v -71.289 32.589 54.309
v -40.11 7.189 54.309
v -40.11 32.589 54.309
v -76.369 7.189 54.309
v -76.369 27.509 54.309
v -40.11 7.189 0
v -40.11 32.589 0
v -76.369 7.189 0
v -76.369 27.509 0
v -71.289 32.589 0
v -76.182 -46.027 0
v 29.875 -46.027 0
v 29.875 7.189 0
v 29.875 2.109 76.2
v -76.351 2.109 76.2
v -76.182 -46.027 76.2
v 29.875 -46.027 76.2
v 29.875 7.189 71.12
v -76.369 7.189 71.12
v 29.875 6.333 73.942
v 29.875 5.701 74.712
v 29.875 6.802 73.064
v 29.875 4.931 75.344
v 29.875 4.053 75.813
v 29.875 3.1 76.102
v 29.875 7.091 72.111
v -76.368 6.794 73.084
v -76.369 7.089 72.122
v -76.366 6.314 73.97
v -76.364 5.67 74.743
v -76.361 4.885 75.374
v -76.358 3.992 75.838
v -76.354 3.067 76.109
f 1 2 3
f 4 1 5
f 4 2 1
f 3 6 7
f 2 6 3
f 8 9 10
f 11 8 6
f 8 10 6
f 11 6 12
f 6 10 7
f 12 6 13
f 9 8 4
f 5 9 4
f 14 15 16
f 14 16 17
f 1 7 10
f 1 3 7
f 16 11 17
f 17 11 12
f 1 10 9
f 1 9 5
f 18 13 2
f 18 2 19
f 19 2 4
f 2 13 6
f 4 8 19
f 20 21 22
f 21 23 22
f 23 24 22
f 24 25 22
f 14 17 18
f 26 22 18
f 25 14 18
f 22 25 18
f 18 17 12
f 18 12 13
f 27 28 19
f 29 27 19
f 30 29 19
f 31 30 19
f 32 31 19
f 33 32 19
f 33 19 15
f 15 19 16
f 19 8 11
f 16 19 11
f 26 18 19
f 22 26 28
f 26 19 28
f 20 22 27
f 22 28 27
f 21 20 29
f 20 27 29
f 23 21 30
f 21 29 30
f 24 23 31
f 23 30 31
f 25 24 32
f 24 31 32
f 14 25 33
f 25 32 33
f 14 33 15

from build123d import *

# Parameters (mm, degrees)
F1_DEPTH = 76.2
F2_W     = 36.258861
F2_H     = 54.309234
F3_DEPTH = 25.4
F4_SIZE  = 5.08
F5_R     = 5.08


with BuildPart() as f1:
    # F0 (on Top) → F1 (new body)
    with BuildSketch(Plane.XY):
        Polygon((29.875379, 7.188763), (-76.368935, 7.188763), (-76.182216, -46.026755), (29.875379, -46.026755), align=None)
    extrude(amount=F1_DEPTH)

    # F2 (on face) → F3 (join)
    with BuildSketch(Plane(origin=(0, 7.188763, 0), x_dir=(-1, 0, 0), z_dir=(0, 1, 0))):
        with Locations((58.239504, 27.154617)):
            Rectangle(F2_W, F2_H)
    extrude(amount=F3_DEPTH)

    # F4
    f4_edges = [f1.edges().sort_by_distance(p)[0] for p in [
        (-76.368935, 32.588763, 27.154617),
    ]]
    chamfer(f4_edges, length=F4_SIZE)

    # F5
    f5_edges = [f1.edges().sort_by_distance(p)[0] for p in [
        (-23.246778, 7.188763, 76.2),
    ]]
    fillet(f5_edges, radius=F5_R)


solid = f1.part
